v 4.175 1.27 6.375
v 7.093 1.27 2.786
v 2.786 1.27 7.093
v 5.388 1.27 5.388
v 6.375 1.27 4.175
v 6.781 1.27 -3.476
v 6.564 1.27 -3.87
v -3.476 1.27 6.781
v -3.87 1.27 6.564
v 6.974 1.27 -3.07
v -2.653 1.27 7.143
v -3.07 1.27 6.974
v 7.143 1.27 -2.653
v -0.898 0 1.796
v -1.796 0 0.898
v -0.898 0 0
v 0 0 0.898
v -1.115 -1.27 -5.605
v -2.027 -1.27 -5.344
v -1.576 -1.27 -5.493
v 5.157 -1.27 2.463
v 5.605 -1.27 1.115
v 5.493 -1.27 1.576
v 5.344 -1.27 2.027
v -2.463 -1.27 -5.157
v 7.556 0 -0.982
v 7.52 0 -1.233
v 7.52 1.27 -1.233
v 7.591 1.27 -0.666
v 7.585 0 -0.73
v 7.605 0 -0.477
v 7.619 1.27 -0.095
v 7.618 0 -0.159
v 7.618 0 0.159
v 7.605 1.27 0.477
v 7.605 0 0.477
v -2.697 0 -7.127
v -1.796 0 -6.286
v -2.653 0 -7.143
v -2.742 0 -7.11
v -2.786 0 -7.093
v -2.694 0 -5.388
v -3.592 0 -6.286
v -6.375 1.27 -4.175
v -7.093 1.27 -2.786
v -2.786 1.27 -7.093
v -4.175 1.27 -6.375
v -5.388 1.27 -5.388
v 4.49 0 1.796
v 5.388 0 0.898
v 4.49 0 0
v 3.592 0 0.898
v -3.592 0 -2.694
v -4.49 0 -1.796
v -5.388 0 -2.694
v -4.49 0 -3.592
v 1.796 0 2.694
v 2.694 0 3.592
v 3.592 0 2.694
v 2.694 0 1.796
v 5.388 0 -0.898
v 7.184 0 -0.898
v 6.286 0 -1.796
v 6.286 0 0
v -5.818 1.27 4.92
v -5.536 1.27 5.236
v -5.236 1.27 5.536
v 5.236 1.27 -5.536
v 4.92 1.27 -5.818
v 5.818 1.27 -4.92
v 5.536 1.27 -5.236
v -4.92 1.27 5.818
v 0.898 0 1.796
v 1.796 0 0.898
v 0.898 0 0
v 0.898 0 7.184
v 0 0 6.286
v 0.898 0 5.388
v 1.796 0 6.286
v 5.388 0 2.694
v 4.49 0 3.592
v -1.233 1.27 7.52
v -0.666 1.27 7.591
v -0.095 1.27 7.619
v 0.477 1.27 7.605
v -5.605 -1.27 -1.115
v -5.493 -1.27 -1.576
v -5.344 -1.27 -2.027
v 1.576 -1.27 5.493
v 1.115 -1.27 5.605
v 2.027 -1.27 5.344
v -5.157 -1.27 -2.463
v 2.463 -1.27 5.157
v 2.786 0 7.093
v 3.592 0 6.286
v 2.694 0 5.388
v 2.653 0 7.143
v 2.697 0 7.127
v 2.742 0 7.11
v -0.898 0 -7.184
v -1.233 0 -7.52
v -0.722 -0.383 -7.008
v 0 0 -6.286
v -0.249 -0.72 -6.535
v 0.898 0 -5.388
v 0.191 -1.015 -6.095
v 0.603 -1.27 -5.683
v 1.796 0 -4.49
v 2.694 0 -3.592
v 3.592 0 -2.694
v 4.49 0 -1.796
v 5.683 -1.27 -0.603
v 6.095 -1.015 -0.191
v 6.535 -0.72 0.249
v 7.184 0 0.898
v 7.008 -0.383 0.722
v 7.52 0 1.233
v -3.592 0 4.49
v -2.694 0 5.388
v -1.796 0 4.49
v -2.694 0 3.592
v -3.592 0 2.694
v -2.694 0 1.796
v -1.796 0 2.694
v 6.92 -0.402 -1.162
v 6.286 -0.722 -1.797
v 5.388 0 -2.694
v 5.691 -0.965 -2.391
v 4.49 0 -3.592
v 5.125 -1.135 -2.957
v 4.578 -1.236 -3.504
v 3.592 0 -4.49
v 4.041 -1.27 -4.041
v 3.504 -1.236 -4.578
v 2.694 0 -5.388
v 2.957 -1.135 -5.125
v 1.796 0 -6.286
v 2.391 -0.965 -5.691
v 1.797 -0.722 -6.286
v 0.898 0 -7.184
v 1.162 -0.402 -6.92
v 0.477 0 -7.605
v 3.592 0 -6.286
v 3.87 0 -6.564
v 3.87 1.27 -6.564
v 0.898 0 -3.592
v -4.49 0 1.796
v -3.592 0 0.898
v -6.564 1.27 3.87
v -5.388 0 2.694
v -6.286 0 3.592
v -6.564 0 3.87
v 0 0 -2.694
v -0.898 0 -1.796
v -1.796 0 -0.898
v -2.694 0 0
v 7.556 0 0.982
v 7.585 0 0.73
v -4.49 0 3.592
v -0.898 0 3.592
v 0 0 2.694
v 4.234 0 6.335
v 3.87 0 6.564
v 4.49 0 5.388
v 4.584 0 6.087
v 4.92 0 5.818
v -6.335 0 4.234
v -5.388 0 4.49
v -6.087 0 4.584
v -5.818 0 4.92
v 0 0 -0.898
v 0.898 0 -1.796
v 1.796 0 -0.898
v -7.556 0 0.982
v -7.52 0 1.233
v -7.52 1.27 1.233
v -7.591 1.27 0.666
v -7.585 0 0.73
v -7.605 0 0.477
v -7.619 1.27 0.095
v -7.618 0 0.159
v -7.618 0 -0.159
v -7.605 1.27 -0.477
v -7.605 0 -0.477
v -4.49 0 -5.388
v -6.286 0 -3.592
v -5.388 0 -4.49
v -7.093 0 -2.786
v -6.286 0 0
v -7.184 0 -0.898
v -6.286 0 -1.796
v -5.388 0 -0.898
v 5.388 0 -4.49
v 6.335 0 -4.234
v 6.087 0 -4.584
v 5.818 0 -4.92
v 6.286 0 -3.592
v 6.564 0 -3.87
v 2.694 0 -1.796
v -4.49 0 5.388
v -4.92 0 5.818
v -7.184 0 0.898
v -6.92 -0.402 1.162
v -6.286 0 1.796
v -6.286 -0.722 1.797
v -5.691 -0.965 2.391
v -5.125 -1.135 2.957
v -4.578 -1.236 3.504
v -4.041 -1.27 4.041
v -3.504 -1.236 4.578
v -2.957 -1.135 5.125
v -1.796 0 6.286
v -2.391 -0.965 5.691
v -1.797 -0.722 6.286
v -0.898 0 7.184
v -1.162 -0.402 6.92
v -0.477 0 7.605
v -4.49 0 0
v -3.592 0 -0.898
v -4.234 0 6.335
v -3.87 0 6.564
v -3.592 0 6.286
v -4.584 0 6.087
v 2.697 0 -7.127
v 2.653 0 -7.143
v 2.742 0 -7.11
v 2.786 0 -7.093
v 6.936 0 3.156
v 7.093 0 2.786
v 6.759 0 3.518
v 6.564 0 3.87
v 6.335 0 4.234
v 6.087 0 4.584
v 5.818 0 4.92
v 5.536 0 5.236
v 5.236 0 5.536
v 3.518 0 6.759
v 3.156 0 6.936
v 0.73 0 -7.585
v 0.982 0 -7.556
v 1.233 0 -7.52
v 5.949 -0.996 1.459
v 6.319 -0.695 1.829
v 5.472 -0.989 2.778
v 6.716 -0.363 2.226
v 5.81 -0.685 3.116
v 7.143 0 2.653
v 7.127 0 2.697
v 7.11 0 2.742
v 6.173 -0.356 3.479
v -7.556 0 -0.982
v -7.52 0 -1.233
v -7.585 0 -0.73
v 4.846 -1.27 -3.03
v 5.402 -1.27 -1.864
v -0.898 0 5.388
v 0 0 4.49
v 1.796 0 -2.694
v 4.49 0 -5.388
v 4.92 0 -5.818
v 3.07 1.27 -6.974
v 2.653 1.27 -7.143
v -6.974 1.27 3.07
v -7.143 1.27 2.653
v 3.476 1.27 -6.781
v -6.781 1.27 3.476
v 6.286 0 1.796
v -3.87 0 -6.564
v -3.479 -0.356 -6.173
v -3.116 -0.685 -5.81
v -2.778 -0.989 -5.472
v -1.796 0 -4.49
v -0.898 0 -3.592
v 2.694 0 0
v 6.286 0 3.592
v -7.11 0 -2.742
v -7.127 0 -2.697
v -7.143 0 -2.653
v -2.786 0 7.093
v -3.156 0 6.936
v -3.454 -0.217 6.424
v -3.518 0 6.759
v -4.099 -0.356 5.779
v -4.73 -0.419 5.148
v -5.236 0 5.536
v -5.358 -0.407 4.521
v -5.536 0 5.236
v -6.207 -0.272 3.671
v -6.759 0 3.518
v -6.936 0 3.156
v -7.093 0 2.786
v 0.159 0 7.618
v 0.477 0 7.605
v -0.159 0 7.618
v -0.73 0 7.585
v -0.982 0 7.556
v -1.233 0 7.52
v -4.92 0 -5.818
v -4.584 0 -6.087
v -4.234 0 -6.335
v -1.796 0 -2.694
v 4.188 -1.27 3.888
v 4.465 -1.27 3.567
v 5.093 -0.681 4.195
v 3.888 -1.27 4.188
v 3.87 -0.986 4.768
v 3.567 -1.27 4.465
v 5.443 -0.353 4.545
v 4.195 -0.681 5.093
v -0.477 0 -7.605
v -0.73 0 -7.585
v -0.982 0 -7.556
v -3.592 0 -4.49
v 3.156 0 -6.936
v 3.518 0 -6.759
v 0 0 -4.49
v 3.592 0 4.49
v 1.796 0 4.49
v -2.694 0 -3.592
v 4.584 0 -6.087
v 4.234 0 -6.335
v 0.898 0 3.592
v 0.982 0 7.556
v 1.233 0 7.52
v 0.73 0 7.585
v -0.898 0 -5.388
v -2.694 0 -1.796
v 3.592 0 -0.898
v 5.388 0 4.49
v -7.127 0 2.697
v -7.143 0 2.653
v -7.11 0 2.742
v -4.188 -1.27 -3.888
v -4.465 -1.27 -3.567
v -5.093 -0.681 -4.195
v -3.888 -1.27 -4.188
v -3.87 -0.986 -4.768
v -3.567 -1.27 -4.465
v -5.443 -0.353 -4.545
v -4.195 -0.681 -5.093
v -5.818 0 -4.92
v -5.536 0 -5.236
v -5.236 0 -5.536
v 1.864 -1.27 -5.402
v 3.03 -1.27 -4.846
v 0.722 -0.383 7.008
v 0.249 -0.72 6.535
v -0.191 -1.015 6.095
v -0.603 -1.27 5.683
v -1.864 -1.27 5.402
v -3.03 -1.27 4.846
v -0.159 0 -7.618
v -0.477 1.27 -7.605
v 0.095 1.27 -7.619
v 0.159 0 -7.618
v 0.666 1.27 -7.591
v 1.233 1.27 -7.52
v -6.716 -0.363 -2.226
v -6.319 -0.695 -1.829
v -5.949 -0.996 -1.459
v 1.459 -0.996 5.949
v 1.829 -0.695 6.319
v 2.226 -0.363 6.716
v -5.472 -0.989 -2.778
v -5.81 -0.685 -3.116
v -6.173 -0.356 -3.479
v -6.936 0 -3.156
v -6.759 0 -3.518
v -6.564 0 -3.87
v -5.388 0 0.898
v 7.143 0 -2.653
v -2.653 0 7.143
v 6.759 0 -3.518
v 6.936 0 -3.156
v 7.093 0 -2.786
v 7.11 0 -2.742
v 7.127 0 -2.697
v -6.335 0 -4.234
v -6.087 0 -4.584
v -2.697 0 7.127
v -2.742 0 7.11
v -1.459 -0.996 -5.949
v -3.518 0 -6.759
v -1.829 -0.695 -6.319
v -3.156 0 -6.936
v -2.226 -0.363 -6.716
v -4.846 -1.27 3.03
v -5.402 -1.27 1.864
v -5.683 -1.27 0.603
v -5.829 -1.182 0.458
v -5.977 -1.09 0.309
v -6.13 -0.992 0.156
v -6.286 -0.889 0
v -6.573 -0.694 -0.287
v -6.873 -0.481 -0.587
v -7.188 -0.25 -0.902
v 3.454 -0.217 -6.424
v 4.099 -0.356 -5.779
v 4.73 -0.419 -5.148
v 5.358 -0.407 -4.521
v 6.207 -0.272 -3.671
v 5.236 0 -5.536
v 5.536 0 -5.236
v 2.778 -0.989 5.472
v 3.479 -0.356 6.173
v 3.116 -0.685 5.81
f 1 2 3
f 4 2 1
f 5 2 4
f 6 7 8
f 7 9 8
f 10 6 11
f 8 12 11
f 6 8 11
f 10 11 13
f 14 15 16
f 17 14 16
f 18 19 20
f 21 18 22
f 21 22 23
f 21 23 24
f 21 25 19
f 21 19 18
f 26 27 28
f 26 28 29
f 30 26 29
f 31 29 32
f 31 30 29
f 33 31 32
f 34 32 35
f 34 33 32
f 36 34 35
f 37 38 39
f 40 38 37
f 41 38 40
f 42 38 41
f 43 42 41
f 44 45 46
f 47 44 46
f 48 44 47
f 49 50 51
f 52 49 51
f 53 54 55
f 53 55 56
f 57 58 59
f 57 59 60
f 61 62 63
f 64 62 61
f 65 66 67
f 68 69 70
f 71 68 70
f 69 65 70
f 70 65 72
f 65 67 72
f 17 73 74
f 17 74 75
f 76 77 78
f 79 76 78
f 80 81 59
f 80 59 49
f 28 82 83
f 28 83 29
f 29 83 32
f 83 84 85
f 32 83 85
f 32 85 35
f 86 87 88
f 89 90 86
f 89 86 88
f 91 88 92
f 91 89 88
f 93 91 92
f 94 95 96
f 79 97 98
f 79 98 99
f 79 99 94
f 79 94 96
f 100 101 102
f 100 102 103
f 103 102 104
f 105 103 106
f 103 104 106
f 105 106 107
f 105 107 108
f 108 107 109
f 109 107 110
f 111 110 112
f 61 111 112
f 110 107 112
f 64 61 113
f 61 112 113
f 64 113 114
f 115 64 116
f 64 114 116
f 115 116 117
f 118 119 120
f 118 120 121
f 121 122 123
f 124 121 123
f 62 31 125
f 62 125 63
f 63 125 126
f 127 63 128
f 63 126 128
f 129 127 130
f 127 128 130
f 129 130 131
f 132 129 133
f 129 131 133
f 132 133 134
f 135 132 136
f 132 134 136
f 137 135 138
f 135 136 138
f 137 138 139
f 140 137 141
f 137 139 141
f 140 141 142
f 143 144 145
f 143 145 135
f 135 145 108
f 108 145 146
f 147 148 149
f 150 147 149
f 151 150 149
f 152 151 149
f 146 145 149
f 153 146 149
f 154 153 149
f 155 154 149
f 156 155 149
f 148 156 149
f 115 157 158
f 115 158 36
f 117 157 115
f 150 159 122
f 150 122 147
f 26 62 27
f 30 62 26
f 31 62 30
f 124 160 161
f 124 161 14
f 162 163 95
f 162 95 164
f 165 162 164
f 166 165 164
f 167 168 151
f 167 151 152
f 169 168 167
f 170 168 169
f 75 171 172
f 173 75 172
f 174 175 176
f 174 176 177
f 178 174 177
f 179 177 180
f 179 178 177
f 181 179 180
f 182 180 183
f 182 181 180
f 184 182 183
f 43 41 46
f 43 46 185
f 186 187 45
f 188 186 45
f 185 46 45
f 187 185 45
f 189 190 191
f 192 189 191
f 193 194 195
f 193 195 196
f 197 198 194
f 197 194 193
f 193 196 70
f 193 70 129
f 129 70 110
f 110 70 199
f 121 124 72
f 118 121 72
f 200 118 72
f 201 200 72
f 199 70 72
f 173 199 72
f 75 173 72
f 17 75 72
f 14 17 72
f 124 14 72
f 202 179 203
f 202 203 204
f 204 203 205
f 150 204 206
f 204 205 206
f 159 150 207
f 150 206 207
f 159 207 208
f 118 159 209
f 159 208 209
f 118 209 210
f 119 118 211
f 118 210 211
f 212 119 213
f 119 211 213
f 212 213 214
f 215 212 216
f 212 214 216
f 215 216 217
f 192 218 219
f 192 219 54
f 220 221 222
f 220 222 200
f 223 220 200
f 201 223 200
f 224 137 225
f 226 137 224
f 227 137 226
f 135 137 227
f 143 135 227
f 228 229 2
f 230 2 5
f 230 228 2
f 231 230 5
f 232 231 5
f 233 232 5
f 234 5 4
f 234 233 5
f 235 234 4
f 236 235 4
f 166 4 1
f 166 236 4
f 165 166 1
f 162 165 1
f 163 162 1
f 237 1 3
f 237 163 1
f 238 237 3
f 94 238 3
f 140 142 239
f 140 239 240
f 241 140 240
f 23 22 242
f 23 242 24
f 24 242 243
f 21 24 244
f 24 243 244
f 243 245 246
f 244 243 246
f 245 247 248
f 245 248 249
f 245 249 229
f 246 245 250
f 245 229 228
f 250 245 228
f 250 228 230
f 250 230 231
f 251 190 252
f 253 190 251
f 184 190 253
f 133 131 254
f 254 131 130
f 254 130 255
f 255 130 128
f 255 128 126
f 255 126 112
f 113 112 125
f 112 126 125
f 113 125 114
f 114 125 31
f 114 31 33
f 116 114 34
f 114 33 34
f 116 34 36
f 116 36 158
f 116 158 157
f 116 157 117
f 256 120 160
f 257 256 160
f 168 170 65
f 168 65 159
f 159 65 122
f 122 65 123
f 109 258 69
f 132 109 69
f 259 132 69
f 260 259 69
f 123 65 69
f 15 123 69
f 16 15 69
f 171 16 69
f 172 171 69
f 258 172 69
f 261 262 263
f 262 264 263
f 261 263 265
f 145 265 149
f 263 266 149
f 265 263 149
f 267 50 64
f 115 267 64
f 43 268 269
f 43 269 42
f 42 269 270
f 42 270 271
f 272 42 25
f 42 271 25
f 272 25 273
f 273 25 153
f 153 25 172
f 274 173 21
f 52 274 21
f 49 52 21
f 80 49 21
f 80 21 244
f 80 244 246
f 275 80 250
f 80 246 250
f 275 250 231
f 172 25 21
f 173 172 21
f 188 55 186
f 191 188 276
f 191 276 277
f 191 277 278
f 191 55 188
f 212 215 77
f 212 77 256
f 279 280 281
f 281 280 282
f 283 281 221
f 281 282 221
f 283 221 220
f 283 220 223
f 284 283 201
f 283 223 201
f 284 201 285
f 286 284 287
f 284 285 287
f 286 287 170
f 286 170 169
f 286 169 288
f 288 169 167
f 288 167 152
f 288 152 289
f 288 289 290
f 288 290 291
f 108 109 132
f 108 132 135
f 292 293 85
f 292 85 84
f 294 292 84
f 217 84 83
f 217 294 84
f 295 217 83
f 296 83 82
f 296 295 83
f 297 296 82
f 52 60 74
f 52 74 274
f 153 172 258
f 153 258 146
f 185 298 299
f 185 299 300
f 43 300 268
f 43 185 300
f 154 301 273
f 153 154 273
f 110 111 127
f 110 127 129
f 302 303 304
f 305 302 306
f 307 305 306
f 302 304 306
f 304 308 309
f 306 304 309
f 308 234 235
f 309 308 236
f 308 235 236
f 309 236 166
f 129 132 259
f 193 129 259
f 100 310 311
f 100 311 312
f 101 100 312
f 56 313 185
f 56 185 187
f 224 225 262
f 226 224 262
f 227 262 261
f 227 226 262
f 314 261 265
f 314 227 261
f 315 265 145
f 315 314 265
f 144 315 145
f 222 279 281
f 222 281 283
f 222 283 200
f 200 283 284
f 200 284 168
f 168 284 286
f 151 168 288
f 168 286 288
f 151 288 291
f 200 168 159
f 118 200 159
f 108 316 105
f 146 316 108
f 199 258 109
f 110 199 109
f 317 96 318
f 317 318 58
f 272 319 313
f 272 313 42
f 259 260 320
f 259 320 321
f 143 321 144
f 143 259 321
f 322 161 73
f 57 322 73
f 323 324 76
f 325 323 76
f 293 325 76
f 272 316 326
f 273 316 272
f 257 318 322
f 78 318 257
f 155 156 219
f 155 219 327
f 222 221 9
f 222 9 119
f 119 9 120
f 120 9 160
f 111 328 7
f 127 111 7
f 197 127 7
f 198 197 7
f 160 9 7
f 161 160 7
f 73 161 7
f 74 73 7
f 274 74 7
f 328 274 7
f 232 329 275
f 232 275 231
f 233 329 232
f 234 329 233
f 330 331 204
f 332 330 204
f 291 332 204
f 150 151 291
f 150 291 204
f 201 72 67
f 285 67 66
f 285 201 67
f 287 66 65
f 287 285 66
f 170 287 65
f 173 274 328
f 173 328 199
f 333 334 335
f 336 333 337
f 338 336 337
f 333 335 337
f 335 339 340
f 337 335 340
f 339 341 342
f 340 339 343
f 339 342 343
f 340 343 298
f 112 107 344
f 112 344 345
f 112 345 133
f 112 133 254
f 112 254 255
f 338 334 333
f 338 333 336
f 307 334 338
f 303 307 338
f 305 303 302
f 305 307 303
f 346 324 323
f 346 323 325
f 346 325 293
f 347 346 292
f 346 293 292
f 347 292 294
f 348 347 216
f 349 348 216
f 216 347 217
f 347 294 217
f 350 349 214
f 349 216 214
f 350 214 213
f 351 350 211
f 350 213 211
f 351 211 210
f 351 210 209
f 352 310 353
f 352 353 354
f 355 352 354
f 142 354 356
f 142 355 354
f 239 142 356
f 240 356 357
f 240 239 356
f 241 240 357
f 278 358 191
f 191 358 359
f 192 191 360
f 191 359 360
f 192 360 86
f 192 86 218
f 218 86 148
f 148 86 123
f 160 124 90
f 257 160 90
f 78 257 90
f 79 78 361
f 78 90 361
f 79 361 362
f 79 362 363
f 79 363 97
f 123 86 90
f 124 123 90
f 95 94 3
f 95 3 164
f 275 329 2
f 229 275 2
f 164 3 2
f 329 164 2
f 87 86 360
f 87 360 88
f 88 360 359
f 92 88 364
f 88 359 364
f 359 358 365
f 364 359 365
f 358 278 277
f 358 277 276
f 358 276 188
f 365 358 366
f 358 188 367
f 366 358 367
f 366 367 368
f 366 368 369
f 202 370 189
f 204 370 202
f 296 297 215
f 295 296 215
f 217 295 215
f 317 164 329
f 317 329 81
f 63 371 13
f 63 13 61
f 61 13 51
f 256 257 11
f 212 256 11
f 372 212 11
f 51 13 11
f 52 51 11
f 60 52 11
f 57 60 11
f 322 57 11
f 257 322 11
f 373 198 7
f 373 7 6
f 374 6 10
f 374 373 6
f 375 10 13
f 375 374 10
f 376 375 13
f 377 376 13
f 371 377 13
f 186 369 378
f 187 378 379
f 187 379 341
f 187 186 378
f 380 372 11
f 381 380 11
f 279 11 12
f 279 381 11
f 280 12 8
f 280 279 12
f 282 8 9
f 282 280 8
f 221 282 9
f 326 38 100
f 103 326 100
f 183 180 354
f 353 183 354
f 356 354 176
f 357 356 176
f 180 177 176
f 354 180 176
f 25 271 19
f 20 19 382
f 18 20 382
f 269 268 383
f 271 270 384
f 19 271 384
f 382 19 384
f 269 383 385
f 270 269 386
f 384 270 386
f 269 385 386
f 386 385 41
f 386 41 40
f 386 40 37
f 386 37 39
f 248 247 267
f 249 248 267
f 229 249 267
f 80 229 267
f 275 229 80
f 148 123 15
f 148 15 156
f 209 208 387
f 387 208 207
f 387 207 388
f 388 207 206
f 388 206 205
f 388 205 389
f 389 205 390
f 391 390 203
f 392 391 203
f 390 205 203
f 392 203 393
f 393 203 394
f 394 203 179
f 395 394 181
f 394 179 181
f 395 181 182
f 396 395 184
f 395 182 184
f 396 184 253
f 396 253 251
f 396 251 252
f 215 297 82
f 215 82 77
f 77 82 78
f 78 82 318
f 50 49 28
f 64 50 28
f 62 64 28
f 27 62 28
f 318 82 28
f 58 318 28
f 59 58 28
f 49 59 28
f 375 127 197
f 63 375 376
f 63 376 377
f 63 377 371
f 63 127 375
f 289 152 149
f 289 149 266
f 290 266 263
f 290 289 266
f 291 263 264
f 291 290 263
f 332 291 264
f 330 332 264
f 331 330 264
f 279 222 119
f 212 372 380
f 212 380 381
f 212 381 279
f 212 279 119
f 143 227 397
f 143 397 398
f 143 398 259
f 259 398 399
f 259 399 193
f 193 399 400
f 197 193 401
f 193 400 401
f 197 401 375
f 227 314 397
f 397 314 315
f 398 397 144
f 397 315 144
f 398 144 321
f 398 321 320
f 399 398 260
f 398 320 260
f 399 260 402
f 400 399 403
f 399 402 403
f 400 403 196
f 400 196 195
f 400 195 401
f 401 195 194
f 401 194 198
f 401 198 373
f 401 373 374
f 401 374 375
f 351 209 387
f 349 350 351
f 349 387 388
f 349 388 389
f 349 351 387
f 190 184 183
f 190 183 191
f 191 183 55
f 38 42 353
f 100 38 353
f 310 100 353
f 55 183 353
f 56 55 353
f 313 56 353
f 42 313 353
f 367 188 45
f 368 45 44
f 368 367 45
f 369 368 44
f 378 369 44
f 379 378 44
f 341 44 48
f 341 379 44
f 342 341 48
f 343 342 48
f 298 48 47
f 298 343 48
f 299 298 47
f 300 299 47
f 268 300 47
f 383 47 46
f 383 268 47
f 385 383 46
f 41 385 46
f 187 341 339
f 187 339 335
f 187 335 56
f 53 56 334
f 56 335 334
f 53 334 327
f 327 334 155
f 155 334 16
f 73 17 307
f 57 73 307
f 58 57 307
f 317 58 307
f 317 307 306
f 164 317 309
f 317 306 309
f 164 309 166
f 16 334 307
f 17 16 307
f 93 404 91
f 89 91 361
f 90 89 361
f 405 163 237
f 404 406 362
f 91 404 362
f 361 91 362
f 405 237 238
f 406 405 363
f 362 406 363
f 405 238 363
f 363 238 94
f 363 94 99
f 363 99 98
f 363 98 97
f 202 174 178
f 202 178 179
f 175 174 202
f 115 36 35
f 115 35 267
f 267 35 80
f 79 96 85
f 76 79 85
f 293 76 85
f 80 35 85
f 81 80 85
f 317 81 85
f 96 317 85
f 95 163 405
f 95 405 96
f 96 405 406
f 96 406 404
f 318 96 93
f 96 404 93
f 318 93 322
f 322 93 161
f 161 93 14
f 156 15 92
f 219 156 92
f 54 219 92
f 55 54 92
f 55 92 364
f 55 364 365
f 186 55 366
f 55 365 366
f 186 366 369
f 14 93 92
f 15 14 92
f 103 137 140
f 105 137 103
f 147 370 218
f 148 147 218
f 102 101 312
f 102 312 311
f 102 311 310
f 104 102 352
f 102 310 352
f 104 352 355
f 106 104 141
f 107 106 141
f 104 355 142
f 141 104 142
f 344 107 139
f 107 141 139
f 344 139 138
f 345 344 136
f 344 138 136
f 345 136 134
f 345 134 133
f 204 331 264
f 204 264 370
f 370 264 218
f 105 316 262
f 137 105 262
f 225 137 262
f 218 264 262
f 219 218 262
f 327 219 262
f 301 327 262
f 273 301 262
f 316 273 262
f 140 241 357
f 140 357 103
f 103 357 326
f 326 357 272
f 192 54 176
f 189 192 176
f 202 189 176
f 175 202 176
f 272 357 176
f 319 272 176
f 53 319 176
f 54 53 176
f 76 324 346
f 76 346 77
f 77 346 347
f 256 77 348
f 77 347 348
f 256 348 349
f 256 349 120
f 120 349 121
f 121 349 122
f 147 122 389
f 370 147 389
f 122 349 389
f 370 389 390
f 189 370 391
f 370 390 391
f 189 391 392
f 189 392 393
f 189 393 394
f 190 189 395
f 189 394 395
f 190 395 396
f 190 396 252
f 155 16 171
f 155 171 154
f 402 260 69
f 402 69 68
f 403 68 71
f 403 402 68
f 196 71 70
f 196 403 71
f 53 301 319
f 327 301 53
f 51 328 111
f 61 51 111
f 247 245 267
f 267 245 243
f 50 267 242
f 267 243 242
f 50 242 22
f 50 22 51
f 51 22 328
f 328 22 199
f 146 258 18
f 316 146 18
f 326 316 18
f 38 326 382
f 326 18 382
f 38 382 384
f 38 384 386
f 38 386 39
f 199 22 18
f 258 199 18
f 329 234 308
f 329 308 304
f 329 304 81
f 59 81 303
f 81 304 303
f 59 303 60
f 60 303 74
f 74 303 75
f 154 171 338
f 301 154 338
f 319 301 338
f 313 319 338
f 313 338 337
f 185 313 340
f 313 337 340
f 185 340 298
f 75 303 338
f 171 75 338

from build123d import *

# Parameters (mm, degrees)
F0_R     = 7.62
F1_DEPTH = 1.27
F3_DEPTH = 1.27
F5_DEPTH = 1.27


with BuildPart() as f1:
    # F0 (on Front) → F1 (new body, symmetric)
    with BuildSketch(Plane.XZ):
        Circle(F0_R)
    extrude(amount=F1_DEPTH, both=True)

    # F2 (on face) → F3 (cut)
    with BuildSketch(Plane.XZ.offset(1.27)):
        with BuildLine():
            Line((7.6050439154, -0.4771865936), (0.4771865936, -7.6050439154))
            ThreePointArc((0.4771865936, -7.6050439154), (1.6514714828, -7.438887144), (2.7857510969, -7.0925306362))
            Line((2.7857510969, -7.0925306362), (7.0925306362, -2.7857510969))
            ThreePointArc((7.0925306362, -2.7857510969), (7.438887144, -1.6514714828), (7.6050439154, -0.4771865936))
        make_face()
        with BuildLine():
            Line((7.1432154673, 2.6530874068), (-2.6530874068, -7.1432154673))
            ThreePointArc((-2.6530874068, -7.1432154673), (-1.9523045555, -7.3656572635), (-1.2333458364, -7.5195251212))
            Line((-1.2333458364, -7.5195251212), (7.5195251212, 1.2333458364))
            ThreePointArc((7.5195251212, 1.2333458364), (7.3656572635, 1.9523045555), (7.1432154673, 2.6530874068))
        make_face()
        with BuildLine():
            Line((5.8184250178, 4.9203994057), (-4.9203994057, -5.8184250178))
            ThreePointArc((-4.9203994057, -5.8184250178), (-4.410994208, -6.2134958032), (-3.8700189421, -6.5640957784))
            Line((-3.8700189421, -6.5640957784), (6.5640957784, 3.8700189421))
            ThreePointArc((6.5640957784, 3.8700189421), (6.2134958032, 4.410994208), (5.8184250178, 4.9203994057))
        make_face()
        with BuildLine():
            Line((3.8700189421, 6.5640957784), (-6.5640957784, -3.8700189421))
            ThreePointArc((-6.5640957784, -3.8700189421), (-6.2134958032, -4.410994208), (-5.8184250178, -4.9203994057))
            Line((-5.8184250178, -4.9203994057), (4.9203994057, 5.8184250178))
            ThreePointArc((4.9203994057, 5.8184250178), (4.410994208, 6.2134958032), (3.8700189421, 6.5640957784))
        make_face()
        with BuildLine():
            Line((1.2333458364, 7.5195251212), (-7.5195251212, -1.2333458364))
            ThreePointArc((-7.5195251212, -1.2333458364), (-7.3656572635, -1.9523045555), (-7.1432154673, -2.6530874068))
            Line((-7.1432154673, -2.6530874068), (2.6530874068, 7.1432154673))
            ThreePointArc((2.6530874068, 7.1432154673), (1.9523045555, 7.3656572635), (1.2333458364, 7.5195251212))
        make_face()
        with BuildLine():
            Line((-2.7857510969, 7.0925306362), (-7.0925306362, 2.7857510969))
            ThreePointArc((-7.0925306362, 2.7857510969), (-7.438887144, 1.6514714828), (-7.6050439154, 0.4771865936))
            Line((-7.6050439154, 0.4771865936), (-0.4771865936, 7.6050439154))
            ThreePointArc((-0.4771865936, 7.6050439154), (-1.6514714828, 7.438887144), (-2.7857510969, 7.0925306362))
        make_face()
    extrude(amount=-F3_DEPTH, mode=Mode.SUBTRACT)

    # F4 (on face) → F5 (cut)
    with BuildSketch(Plane(origin=(0, 1.27, 0), x_dir=(-1, 0, 0), z_dir=(0, 1, 0))):
        with BuildLine():
            ThreePointArc((-7.0925306362, 2.7857510969), (-7.438887144, 1.6514714828), (-7.6050439154, 0.4771865936))
            Line((-7.6050439154, 0.4771865936), (-0.4771865936, 7.6050439154))
            ThreePointArc((-0.4771865936, 7.6050439154), (-1.6514714828, 7.438887144), (-2.7857510969, 7.0925306362))
            Line((-2.7857510969, 7.0925306362), (-7.0925306362, 2.7857510969))
        make_face()
        with BuildLine():
            ThreePointArc((-7.5195251212, -1.2333458364), (-7.3656572635, -1.9523045555), (-7.1432154673, -2.6530874068))
            Line((-7.1432154673, -2.6530874068), (2.6530874068, 7.1432154673))
            ThreePointArc((2.6530874068, 7.1432154673), (1.9523045555, 7.3656572635), (1.2333458364, 7.5195251212))
            Line((1.2333458364, 7.5195251212), (-7.5195251212, -1.2333458364))
        make_face()
        with BuildLine():
            ThreePointArc((-6.5640957784, -3.8700189421), (-6.2134958032, -4.410994208), (-5.8184250178, -4.9203994057))
            Line((-5.8184250178, -4.9203994057), (4.9203994057, 5.8184250178))
            ThreePointArc((4.9203994057, 5.8184250178), (4.410994208, 6.2134958032), (3.8700189421, 6.5640957784))
            Line((3.8700189421, 6.5640957784), (-6.5640957784, -3.8700189421))
        make_face()
        with BuildLine():
            ThreePointArc((-4.9203994057, -5.8184250178), (-4.410994208, -6.2134958032), (-3.8700189421, -6.5640957784))
            Line((-3.8700189421, -6.5640957784), (6.5640957784, 3.8700189421))
            ThreePointArc((6.5640957784, 3.8700189421), (6.2134958032, 4.410994208), (5.8184250178, 4.9203994057))
            Line((5.8184250178, 4.9203994057), (-4.9203994057, -5.8184250178))
        make_face()
        with BuildLine():
            ThreePointArc((-2.6530874068, -7.1432154673), (-1.9523045555, -7.3656572635), (-1.2333458364, -7.5195251212))
            Line((-1.2333458364, -7.5195251212), (7.5195251212, 1.2333458364))
            ThreePointArc((7.5195251212, 1.2333458364), (7.3656572635, 1.9523045555), (7.1432154673, 2.6530874068))
            Line((7.1432154673, 2.6530874068), (-2.6530874068, -7.1432154673))
        make_face()
        with BuildLine():
            Line((2.7857510969, -7.0925306362), (7.0925306362, -2.7857510969))
            ThreePointArc((7.0925306362, -2.7857510969), (7.438887144, -1.6514714828), (7.6050439154, -0.4771865936))
            Line((7.6050439154, -0.4771865936), (0.4771865936, -7.6050439154))
            ThreePointArc((0.4771865936, -7.6050439154), (1.6514714828, -7.438887144), (2.7857510969, -7.0925306362))
        make_face()
    extrude(amount=-F5_DEPTH, mode=Mode.SUBTRACT)

    # F6 (on Top) → F7 (revolve, cut)
    with BuildSketch(Plane.XY):
        Polygon((-5.715, -1.27), (-7.62, 0), (-7.62, -1.27), align=None)
    revolve(axis=Axis((0, -1.3864838984, 0), (0, -1, 0)), mode=Mode.SUBTRACT)


solid = f1.part
